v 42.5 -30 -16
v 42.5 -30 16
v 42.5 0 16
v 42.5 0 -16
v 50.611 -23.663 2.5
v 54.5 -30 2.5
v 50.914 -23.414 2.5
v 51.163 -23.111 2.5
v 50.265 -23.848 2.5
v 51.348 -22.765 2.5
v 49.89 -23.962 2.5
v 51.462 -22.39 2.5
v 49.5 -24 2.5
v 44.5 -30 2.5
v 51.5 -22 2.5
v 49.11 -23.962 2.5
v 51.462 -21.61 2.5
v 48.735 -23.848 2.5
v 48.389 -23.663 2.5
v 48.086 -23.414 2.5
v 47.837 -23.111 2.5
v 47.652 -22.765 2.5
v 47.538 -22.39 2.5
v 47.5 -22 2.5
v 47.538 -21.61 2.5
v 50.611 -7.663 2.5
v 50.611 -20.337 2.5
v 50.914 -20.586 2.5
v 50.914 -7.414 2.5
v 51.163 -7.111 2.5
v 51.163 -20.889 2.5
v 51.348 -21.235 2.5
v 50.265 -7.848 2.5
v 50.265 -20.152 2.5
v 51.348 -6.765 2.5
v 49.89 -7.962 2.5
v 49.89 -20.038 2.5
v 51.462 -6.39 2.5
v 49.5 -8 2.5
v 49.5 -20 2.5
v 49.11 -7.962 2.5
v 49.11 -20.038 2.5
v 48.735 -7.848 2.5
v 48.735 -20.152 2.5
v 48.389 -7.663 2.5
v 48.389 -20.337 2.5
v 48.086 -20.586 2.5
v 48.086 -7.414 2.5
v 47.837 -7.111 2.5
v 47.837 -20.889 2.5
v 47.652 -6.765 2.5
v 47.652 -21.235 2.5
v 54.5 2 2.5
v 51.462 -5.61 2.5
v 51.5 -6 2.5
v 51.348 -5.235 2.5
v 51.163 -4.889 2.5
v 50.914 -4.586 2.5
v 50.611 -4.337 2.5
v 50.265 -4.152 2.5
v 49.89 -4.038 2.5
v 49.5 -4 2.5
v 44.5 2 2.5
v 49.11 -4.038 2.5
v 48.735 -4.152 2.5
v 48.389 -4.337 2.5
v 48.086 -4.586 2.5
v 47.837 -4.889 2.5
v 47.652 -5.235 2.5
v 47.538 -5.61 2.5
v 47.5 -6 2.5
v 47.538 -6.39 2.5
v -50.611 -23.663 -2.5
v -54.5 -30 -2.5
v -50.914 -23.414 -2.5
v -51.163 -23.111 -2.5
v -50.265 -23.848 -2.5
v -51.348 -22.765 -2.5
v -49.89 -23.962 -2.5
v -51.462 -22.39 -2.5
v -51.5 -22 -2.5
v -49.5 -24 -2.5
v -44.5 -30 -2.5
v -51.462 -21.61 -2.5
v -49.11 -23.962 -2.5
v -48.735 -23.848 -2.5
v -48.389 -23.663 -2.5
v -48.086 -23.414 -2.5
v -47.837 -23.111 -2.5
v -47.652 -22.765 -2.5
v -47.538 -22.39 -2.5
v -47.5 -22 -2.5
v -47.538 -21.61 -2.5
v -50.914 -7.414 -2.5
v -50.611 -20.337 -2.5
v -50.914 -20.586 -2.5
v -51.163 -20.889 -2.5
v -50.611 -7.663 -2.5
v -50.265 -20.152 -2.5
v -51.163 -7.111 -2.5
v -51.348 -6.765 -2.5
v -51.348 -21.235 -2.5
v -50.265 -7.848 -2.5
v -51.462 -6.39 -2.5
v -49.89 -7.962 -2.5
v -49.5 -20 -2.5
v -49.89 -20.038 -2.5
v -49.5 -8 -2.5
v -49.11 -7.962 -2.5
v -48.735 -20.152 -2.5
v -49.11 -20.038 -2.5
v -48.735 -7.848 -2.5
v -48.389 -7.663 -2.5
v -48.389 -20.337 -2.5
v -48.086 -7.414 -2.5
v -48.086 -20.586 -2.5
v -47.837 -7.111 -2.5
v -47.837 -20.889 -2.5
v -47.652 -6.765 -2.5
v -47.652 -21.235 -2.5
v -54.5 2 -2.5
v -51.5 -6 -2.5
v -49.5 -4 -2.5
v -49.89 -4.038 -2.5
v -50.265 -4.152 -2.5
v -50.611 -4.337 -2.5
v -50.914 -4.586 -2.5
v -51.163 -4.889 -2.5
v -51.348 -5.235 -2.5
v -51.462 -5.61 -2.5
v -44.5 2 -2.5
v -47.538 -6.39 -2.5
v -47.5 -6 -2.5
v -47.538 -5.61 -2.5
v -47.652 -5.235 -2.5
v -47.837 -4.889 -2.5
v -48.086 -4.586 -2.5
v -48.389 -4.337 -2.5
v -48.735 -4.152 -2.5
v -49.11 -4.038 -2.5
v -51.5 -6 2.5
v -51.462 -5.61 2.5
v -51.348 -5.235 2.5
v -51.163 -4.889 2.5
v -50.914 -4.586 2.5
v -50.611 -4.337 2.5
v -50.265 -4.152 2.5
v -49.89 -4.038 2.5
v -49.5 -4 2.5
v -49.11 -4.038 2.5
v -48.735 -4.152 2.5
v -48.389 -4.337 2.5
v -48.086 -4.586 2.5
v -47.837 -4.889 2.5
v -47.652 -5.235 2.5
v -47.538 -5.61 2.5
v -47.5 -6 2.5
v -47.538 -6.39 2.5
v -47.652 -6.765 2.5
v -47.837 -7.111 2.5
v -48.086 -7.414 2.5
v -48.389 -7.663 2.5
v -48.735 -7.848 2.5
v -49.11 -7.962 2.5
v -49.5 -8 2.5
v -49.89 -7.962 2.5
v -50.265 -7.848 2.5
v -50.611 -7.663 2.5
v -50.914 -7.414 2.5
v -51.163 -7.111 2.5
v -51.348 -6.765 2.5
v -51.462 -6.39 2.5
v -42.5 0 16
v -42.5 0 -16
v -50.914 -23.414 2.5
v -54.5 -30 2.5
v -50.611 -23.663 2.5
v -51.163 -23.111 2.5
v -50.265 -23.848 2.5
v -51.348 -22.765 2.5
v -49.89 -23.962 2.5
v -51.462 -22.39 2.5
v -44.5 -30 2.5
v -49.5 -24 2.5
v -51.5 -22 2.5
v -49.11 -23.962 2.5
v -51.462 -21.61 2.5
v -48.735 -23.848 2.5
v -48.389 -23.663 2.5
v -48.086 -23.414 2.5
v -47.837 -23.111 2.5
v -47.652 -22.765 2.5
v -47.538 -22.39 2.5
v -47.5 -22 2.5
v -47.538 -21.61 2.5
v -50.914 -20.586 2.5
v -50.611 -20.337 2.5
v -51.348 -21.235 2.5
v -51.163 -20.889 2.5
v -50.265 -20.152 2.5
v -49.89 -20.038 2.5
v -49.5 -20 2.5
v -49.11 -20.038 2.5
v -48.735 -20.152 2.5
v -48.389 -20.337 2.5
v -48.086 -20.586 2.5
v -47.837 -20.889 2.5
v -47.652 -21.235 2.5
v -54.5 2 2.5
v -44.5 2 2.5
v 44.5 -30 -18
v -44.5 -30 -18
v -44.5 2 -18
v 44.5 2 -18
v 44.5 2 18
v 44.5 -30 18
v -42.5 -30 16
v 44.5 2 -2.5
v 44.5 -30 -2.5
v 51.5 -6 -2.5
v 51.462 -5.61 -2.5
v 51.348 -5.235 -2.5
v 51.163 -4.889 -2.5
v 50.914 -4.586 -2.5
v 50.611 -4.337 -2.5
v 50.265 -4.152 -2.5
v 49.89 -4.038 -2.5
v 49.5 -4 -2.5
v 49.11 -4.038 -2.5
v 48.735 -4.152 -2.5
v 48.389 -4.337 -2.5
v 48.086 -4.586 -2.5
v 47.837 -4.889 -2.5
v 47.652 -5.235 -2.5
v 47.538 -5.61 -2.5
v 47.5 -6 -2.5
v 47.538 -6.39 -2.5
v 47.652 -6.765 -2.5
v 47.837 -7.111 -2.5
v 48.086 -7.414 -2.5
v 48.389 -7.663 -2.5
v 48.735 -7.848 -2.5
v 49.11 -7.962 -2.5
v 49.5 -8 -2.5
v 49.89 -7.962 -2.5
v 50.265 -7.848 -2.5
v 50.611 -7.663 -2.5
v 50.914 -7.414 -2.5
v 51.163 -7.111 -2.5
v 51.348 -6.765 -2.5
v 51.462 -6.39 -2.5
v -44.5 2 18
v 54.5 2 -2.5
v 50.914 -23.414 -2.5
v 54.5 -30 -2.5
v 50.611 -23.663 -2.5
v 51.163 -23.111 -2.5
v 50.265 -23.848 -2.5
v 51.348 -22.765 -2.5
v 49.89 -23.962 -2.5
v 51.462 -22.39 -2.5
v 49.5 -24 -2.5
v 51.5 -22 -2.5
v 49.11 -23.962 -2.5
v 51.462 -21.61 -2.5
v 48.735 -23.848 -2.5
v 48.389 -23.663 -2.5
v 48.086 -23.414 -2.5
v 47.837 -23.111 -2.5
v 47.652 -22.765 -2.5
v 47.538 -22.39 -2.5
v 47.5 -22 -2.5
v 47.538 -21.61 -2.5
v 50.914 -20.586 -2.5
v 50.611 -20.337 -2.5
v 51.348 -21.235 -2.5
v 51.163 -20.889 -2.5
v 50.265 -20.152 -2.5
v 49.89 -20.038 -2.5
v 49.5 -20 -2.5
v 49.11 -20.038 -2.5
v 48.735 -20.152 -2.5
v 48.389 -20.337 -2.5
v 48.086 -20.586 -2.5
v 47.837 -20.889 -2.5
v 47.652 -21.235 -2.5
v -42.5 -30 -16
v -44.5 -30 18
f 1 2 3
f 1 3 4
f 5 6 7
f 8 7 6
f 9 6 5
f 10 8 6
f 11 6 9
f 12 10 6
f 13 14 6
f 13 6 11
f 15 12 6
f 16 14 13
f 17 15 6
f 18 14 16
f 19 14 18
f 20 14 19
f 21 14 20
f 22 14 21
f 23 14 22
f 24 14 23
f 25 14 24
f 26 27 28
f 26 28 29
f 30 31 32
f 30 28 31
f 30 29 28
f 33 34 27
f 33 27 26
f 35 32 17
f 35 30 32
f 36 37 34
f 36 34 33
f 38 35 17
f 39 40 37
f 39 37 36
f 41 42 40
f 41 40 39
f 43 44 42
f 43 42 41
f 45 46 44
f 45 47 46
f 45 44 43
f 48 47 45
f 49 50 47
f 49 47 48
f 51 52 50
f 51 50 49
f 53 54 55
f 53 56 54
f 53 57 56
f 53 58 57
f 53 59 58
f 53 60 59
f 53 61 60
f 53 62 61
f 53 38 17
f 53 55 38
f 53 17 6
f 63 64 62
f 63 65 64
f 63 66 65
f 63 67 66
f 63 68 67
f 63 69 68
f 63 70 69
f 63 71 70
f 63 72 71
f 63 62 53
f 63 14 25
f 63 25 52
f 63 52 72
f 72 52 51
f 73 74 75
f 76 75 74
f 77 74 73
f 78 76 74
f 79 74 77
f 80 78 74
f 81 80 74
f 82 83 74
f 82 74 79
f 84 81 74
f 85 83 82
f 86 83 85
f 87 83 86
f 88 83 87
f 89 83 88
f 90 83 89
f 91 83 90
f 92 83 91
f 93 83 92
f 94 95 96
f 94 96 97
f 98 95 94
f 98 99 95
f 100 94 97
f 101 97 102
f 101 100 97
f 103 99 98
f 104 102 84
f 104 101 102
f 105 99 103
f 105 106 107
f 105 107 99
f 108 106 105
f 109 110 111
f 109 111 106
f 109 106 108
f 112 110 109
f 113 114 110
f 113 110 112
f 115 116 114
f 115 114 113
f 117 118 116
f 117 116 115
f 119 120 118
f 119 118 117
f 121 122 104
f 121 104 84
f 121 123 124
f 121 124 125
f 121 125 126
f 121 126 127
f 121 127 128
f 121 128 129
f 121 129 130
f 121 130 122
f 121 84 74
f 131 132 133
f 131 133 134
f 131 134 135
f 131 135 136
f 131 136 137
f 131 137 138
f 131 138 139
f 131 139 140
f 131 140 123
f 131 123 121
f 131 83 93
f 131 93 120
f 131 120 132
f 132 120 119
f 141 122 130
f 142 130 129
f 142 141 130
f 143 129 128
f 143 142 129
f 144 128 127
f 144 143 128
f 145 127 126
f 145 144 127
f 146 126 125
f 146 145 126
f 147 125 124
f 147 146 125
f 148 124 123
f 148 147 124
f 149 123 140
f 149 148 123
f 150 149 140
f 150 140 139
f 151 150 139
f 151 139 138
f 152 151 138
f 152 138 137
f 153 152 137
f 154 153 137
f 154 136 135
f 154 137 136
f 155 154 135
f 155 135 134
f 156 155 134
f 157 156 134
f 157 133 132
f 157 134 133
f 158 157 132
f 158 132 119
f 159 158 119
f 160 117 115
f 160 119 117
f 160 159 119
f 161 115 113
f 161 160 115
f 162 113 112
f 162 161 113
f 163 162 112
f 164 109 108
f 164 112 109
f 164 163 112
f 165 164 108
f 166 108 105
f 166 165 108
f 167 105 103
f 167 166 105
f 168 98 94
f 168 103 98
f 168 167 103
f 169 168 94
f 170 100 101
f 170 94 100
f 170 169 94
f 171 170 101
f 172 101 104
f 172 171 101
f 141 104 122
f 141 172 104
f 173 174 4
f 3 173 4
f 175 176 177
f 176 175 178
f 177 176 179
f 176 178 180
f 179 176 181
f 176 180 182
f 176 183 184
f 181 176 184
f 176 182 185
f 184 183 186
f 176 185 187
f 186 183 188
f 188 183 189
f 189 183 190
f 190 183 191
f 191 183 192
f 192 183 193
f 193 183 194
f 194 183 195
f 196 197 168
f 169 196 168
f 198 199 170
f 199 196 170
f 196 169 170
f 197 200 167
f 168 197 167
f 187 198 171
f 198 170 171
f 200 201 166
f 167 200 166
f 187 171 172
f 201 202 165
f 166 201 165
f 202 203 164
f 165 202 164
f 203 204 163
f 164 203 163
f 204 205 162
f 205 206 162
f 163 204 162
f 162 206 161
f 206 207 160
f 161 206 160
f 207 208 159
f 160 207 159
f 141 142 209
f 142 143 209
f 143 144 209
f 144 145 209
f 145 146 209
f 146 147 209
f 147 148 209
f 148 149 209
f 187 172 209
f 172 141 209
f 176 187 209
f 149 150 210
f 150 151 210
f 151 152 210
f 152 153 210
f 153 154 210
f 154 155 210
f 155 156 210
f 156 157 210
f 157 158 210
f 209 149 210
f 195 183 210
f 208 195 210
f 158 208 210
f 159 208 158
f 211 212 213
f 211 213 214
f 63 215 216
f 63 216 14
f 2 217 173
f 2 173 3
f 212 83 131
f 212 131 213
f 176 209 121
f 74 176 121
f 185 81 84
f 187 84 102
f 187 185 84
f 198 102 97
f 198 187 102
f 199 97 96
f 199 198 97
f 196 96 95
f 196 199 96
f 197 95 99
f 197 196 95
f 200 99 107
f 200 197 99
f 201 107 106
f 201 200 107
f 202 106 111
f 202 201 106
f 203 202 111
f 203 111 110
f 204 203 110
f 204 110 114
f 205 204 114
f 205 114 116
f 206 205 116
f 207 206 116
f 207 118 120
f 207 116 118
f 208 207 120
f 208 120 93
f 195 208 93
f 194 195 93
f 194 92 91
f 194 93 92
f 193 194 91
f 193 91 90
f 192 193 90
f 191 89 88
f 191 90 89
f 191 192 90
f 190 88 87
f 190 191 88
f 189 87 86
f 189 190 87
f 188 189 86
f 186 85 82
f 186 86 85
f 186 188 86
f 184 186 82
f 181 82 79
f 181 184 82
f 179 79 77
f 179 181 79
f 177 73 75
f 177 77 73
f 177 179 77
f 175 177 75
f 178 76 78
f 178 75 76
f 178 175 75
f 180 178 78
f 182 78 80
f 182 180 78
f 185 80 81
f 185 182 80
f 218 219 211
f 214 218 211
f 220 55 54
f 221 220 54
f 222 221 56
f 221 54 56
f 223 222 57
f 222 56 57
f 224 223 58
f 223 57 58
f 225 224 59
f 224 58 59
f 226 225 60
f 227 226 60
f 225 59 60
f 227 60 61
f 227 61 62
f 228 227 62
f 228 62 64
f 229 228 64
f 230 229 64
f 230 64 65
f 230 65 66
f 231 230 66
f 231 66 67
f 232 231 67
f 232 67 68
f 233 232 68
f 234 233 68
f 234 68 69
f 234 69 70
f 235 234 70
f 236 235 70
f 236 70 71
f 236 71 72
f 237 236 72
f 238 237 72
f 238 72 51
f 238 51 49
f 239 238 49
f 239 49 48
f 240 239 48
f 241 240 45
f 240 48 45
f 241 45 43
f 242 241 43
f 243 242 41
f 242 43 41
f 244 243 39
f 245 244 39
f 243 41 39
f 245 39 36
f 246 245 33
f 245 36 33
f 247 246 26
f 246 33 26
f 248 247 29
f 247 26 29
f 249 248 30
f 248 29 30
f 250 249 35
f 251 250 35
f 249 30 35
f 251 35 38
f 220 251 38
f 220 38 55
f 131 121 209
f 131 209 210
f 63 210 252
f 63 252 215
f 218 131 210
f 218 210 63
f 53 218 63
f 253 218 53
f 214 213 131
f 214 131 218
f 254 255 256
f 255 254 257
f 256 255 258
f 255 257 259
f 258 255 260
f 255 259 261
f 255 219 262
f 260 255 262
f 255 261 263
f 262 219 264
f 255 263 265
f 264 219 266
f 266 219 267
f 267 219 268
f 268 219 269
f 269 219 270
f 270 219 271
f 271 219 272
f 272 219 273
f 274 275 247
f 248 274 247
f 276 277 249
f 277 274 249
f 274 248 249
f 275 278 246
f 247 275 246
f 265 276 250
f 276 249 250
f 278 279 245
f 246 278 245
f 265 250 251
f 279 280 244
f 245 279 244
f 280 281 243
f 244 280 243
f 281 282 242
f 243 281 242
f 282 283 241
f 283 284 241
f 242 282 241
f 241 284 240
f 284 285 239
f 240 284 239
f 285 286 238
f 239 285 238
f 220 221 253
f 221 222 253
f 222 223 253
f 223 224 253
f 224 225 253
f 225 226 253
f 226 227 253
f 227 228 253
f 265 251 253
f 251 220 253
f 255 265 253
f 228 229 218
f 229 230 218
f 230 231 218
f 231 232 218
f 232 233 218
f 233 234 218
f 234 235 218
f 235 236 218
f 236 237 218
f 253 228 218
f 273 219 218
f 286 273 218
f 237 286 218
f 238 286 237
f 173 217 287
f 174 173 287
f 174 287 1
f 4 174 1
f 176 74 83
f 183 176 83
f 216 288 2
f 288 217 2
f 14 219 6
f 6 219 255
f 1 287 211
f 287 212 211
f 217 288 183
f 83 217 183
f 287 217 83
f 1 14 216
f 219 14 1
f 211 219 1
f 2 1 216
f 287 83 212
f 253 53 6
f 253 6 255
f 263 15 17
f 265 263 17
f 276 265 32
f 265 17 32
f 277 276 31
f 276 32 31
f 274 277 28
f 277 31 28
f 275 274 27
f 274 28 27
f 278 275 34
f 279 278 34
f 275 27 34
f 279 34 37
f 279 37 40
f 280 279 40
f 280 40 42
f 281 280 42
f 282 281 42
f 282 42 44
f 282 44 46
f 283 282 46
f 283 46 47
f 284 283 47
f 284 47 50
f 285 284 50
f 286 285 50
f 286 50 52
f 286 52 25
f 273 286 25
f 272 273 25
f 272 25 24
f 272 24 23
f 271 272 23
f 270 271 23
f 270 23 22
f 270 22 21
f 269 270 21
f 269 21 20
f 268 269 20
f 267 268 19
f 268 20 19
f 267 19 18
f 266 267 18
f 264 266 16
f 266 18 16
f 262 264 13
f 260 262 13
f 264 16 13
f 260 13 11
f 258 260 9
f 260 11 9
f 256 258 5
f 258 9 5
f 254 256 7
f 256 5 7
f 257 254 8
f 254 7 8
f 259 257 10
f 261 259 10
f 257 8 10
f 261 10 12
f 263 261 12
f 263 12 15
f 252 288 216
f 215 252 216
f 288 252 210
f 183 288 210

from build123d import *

# Parameters (mm, degrees)
SKETCH2_W                = 85
SKETCH2_H                = 32
BOSS_EXTRUDE1_DEPTH      = 2
EXTRUDE_THIN1_DEPTH      = 2
EXTRUDE_THIN1_DEPTH_BACK = 30
SKETCH2_2_W              = 89
SKETCH2_2_H              = 36
SKETCH2_2_W_2            = 85
SKETCH2_2_H_2            = 32
SKETCH3_W                = 5
SKETCH3_H                = 32
BOSS_EXTRUDE2_DEPTH      = 10
SKETCH4_R                = 2
CUT_EXTRUDE1_DEPTH       = 66.501908369


with BuildPart() as part:
    # Sketch2 → Boss-Extrude1 (new body)
    with BuildSketch(Plane(origin=(0, 0, 0), x_dir=(1, 0, 0), z_dir=(0, 1, 0))):
        Rectangle(SKETCH2_W, SKETCH2_H)
    extrude(amount=BOSS_EXTRUDE1_DEPTH)

    # Sketch2<2> → Extrude-Thin1 (add, two sides: drawn at the far end of the back side and taken through both)
    with BuildSketch(Plane(origin=(0, 0, 0), x_dir=(1, 0, 0), z_dir=(0, 1, 0)).offset(-EXTRUDE_THIN1_DEPTH_BACK)):
        Rectangle(SKETCH2_2_W, SKETCH2_2_H)
        Rectangle(SKETCH2_2_W_2, SKETCH2_2_H_2, mode=Mode.SUBTRACT)
    extrude(amount=EXTRUDE_THIN1_DEPTH + EXTRUDE_THIN1_DEPTH_BACK)

    # Sketch3 → Boss-Extrude2 (add)
    with BuildSketch(Plane(origin=(44.5, 0, 0), x_dir=(0, 0, -1), z_dir=(1, 0, 0))):
        with Locations((0, -14)):
            Rectangle(SKETCH3_W, SKETCH3_H)
    boss_extrude2 = extrude(amount=BOSS_EXTRUDE2_DEPTH)

    # Sketch4 → Cut-Extrude1 (cut, through all)
    with BuildSketch(Plane.XY.offset(2.5)):
        with Locations((49.5, -6)):
            Circle(SKETCH4_R)
        with Locations((49.5, -22)):
            Circle(SKETCH4_R)
    cut_extrude1 = extrude(amount=-CUT_EXTRUDE1_DEPTH, mode=Mode.SUBTRACT)

    # Mirror1: Boss-Extrude2, Cut-Extrude1 across plane
    add(boss_extrude2.mirror(Plane(origin=(0, 0, 0), x_dir=(0, 0, 1), z_dir=(1, 0, 0))))
    add(cut_extrude1.mirror(Plane(origin=(0, 0, 0), x_dir=(0, 0, 1), z_dir=(1, 0, 0))), mode=Mode.SUBTRACT)


solid = part.part
